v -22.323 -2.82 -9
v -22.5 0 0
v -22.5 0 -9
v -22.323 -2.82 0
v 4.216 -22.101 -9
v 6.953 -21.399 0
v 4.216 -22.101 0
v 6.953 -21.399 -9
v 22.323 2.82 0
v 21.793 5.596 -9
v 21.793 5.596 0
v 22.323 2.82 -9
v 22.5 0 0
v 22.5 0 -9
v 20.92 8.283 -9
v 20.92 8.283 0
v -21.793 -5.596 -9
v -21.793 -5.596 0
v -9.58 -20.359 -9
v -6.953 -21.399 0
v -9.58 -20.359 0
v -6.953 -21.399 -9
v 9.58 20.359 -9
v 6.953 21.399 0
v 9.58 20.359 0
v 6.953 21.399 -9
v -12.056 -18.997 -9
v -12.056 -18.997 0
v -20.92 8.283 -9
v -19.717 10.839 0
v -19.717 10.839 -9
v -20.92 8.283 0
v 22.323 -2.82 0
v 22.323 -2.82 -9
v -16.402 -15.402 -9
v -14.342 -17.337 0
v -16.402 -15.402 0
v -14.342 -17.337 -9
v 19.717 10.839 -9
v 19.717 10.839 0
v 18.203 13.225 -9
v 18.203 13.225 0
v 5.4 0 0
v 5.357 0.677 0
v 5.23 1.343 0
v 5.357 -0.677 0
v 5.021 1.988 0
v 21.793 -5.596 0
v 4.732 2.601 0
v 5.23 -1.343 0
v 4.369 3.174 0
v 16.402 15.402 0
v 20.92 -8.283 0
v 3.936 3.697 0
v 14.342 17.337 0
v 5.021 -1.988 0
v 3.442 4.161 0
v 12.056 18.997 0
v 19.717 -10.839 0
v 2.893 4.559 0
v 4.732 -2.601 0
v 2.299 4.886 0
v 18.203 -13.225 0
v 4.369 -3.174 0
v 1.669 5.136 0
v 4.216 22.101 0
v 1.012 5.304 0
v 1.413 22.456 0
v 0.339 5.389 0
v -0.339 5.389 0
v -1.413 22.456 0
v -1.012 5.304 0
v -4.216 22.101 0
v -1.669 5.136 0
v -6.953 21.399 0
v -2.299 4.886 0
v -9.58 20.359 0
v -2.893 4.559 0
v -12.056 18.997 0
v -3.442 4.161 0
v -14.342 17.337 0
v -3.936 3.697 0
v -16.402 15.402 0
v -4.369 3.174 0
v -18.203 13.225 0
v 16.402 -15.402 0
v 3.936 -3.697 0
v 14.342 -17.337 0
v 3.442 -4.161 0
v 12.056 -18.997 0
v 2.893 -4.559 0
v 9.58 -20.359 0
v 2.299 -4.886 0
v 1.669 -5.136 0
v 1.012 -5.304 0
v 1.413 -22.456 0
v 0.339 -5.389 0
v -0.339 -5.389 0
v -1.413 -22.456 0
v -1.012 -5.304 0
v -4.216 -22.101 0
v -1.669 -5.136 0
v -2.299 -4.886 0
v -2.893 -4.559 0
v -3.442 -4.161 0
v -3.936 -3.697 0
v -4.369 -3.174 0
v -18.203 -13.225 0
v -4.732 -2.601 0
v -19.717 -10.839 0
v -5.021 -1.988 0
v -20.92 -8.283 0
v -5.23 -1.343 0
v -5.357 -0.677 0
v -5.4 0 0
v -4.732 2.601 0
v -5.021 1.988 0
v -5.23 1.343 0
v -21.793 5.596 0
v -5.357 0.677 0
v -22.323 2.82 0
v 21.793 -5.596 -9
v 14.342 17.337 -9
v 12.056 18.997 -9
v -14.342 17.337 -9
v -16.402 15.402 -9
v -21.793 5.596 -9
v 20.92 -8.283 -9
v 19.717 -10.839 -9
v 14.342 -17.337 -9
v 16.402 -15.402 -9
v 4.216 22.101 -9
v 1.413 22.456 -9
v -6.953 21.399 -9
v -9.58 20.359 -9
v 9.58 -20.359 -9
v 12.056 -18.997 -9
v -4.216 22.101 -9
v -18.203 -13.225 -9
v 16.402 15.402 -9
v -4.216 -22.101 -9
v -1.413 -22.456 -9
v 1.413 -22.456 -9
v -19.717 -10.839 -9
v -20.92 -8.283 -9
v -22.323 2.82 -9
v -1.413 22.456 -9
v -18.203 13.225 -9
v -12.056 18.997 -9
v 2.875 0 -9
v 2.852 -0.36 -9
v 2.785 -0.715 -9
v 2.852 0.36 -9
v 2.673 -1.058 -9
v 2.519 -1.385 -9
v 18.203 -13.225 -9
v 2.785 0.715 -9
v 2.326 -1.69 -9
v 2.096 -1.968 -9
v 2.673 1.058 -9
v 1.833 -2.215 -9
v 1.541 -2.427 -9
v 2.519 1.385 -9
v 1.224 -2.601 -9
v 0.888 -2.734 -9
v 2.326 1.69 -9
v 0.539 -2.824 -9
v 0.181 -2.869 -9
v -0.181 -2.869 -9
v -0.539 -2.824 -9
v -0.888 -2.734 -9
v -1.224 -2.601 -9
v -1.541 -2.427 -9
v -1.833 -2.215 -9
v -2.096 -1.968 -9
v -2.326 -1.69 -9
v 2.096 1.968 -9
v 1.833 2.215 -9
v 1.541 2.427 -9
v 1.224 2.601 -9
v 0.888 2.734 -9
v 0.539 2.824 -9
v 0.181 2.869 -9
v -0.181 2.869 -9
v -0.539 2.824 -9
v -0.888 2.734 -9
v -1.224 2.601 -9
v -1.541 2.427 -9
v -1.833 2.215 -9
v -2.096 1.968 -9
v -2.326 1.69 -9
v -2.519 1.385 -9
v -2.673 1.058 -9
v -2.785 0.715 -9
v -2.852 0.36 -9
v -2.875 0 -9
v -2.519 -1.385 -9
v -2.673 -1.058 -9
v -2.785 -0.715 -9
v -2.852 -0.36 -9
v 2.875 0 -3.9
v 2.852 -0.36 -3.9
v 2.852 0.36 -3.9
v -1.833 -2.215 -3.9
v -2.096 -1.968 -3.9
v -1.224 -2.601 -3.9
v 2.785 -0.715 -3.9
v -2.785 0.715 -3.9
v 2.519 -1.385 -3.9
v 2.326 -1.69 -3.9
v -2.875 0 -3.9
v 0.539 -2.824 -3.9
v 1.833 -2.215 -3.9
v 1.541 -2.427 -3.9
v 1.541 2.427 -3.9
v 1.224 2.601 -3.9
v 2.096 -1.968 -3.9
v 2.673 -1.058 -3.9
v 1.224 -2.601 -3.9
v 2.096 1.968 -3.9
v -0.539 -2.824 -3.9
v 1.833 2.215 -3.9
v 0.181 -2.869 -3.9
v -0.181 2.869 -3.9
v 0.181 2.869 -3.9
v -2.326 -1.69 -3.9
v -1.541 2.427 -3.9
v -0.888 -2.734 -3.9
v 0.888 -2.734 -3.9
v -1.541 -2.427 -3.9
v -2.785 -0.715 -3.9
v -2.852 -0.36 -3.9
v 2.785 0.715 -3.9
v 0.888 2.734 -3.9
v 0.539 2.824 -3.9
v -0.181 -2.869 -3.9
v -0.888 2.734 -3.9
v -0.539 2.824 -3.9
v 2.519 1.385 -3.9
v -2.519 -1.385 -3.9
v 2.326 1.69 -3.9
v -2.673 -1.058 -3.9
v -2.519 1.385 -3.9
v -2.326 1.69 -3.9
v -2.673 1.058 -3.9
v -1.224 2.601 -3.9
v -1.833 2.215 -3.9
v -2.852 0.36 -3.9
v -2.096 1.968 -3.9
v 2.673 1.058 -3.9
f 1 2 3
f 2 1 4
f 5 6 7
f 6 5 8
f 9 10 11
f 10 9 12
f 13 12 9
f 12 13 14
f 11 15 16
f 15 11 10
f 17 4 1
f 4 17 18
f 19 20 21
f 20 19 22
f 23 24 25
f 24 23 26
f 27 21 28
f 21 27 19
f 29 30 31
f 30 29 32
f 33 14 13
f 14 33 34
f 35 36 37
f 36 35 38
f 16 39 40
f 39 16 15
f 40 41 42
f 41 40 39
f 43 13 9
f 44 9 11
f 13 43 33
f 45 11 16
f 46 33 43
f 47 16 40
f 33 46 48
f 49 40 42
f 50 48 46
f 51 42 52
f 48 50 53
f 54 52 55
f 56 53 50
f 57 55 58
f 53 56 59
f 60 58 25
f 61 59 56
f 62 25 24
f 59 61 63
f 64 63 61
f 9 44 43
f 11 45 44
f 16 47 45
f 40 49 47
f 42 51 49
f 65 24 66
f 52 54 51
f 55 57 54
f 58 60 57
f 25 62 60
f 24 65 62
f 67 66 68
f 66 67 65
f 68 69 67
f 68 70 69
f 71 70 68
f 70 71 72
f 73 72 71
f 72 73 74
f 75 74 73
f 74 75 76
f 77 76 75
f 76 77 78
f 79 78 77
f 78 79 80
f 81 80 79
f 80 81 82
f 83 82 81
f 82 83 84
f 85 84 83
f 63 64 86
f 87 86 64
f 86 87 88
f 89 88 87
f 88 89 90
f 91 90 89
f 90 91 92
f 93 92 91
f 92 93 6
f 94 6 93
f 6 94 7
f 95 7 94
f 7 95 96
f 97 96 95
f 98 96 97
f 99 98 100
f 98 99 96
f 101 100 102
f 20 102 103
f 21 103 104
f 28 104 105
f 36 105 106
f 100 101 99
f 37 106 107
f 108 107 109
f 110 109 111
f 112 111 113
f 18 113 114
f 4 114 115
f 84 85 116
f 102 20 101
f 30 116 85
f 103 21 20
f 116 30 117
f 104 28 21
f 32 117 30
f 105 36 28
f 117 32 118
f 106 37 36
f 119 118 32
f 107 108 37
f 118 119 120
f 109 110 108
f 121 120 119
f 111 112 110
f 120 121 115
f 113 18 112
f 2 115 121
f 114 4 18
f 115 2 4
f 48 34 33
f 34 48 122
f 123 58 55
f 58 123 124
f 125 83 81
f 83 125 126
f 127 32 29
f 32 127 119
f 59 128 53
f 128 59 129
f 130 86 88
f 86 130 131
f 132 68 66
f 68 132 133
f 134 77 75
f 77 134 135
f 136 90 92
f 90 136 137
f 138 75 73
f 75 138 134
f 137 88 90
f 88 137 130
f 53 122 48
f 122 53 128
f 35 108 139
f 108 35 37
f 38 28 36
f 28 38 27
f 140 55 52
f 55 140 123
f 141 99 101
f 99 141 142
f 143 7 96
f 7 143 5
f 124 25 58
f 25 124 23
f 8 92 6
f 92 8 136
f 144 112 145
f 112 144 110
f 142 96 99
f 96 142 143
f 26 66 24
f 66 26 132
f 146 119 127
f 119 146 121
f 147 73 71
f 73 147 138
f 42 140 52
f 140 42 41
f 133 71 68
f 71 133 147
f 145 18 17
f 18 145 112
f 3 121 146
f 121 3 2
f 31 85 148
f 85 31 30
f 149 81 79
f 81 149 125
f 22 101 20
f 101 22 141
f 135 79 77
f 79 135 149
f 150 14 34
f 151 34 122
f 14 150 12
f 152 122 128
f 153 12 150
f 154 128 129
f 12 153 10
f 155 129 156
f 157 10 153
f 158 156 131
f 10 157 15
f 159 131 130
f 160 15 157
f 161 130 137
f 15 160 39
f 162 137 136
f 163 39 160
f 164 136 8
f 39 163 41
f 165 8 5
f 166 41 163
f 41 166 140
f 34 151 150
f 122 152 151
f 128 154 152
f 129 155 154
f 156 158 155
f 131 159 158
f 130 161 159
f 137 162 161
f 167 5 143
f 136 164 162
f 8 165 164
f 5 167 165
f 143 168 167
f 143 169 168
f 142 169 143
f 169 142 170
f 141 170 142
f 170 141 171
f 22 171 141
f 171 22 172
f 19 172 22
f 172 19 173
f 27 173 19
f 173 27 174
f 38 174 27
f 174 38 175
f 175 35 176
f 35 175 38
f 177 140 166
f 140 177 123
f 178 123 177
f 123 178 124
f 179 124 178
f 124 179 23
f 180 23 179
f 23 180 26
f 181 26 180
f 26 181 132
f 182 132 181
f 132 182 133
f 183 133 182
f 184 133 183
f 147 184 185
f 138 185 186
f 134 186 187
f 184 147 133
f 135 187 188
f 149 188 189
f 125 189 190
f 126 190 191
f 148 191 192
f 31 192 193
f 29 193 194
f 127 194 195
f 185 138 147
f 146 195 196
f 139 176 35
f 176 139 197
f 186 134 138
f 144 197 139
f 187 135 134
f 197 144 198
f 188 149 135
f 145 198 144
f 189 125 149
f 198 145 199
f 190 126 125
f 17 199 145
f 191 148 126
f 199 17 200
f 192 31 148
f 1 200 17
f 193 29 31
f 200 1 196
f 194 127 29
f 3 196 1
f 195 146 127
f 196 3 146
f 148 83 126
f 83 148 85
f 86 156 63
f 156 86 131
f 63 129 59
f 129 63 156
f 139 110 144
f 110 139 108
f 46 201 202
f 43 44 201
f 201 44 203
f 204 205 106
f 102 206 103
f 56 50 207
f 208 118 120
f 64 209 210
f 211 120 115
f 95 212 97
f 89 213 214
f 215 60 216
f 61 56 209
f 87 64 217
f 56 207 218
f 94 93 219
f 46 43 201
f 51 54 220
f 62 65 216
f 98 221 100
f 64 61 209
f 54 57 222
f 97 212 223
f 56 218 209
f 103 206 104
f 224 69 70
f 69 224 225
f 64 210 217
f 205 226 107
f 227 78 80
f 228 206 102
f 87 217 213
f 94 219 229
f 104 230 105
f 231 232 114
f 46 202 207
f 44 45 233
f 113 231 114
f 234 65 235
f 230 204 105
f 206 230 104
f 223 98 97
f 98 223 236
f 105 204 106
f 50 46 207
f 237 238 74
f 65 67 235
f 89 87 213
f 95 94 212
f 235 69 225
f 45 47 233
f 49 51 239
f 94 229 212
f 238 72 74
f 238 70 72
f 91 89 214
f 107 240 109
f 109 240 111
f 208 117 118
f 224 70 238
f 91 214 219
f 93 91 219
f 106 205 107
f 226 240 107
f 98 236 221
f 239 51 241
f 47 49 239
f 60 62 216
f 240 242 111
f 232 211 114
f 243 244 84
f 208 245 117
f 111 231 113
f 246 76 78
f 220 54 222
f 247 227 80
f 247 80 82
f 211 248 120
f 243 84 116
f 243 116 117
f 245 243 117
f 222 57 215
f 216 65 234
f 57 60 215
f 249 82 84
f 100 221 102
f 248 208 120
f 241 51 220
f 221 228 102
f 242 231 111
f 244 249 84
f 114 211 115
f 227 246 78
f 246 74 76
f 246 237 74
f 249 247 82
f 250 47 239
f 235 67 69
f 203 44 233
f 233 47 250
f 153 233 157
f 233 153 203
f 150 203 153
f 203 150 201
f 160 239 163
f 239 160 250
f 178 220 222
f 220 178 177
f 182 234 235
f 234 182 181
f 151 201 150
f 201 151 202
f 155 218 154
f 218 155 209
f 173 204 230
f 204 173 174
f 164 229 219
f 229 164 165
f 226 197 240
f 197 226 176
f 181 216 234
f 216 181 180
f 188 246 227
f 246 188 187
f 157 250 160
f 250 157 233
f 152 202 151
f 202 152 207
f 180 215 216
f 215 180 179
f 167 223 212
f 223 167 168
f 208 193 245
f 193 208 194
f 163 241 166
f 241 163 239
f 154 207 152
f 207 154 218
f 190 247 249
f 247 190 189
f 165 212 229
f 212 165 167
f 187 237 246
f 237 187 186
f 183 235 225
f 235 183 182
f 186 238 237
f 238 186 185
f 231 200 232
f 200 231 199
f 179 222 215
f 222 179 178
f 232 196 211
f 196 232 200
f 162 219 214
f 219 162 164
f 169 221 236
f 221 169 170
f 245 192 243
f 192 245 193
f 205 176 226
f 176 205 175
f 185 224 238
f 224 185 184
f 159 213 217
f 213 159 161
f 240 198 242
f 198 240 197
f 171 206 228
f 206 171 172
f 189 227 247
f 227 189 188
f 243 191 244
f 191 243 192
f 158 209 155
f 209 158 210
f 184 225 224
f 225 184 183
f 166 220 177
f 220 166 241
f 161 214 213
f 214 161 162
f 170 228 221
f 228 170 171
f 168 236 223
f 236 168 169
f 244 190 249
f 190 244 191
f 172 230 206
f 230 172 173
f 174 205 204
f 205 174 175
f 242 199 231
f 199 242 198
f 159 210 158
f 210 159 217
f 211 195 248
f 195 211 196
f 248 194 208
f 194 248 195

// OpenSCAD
$fn = 50;


difference() {
	union() {
		translate(v = [0, 0, -9.0000000000]) {
			cylinder(h = 9, r = 22.5000000000);
		}
		translate(v = [0, 0, -9.0000000000]) {
			cylinder(h = 9, r = 2.8750000000);
		}
	}
	union() {
		translate(v = [0, 0, 0]) {
			rotate(a = [0, 0, 0]) {
				difference() {
					union() {
						#translate(v = [0, 0, -9.0000000000]) {
							cylinder(h = 9, r = 2.6000000000);
						}
						#translate(v = [0, 0, -3.9000000000]) {
							cylinder(h = 3.9000000000, r1 = 2.8750000000, r2 = 5.4000000000);
						}
						#translate(v = [0, 0, -9.0000000000]) {
							cylinder(h = 9, r = 2.8750000000);
						}
						#translate(v = [0, 0, -9.0000000000]) {
							cylinder(h = 9, r = 2.6000000000);
						}
					}
					union();
				}
			}
		}
	}
}
